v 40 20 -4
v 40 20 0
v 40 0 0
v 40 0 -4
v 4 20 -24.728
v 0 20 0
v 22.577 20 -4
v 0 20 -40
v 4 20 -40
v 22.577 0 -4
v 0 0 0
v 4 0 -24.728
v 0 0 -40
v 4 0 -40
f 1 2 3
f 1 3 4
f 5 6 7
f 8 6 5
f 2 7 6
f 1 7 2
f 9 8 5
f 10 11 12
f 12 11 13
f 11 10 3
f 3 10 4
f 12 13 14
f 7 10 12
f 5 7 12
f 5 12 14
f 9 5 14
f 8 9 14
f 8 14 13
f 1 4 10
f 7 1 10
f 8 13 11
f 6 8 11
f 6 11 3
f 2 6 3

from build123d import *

# Parameters (mm, degrees)
EXTRUDE_1_DEPTH = 20


with BuildPart() as part:
    # 草图1 → 凸台-拉伸1 (new body)
    with BuildSketch(Plane(origin=(0, 0, 0), x_dir=(1, 0, 0), z_dir=(0, 1, 0))):
        Polygon((0, 40), (0, 0), (40, 0), (40, 4), (22.576549518, 4), (4, 24.728267981), (4, 40), align=None)
    extrude(amount=EXTRUDE_1_DEPTH)


solid = part.part
